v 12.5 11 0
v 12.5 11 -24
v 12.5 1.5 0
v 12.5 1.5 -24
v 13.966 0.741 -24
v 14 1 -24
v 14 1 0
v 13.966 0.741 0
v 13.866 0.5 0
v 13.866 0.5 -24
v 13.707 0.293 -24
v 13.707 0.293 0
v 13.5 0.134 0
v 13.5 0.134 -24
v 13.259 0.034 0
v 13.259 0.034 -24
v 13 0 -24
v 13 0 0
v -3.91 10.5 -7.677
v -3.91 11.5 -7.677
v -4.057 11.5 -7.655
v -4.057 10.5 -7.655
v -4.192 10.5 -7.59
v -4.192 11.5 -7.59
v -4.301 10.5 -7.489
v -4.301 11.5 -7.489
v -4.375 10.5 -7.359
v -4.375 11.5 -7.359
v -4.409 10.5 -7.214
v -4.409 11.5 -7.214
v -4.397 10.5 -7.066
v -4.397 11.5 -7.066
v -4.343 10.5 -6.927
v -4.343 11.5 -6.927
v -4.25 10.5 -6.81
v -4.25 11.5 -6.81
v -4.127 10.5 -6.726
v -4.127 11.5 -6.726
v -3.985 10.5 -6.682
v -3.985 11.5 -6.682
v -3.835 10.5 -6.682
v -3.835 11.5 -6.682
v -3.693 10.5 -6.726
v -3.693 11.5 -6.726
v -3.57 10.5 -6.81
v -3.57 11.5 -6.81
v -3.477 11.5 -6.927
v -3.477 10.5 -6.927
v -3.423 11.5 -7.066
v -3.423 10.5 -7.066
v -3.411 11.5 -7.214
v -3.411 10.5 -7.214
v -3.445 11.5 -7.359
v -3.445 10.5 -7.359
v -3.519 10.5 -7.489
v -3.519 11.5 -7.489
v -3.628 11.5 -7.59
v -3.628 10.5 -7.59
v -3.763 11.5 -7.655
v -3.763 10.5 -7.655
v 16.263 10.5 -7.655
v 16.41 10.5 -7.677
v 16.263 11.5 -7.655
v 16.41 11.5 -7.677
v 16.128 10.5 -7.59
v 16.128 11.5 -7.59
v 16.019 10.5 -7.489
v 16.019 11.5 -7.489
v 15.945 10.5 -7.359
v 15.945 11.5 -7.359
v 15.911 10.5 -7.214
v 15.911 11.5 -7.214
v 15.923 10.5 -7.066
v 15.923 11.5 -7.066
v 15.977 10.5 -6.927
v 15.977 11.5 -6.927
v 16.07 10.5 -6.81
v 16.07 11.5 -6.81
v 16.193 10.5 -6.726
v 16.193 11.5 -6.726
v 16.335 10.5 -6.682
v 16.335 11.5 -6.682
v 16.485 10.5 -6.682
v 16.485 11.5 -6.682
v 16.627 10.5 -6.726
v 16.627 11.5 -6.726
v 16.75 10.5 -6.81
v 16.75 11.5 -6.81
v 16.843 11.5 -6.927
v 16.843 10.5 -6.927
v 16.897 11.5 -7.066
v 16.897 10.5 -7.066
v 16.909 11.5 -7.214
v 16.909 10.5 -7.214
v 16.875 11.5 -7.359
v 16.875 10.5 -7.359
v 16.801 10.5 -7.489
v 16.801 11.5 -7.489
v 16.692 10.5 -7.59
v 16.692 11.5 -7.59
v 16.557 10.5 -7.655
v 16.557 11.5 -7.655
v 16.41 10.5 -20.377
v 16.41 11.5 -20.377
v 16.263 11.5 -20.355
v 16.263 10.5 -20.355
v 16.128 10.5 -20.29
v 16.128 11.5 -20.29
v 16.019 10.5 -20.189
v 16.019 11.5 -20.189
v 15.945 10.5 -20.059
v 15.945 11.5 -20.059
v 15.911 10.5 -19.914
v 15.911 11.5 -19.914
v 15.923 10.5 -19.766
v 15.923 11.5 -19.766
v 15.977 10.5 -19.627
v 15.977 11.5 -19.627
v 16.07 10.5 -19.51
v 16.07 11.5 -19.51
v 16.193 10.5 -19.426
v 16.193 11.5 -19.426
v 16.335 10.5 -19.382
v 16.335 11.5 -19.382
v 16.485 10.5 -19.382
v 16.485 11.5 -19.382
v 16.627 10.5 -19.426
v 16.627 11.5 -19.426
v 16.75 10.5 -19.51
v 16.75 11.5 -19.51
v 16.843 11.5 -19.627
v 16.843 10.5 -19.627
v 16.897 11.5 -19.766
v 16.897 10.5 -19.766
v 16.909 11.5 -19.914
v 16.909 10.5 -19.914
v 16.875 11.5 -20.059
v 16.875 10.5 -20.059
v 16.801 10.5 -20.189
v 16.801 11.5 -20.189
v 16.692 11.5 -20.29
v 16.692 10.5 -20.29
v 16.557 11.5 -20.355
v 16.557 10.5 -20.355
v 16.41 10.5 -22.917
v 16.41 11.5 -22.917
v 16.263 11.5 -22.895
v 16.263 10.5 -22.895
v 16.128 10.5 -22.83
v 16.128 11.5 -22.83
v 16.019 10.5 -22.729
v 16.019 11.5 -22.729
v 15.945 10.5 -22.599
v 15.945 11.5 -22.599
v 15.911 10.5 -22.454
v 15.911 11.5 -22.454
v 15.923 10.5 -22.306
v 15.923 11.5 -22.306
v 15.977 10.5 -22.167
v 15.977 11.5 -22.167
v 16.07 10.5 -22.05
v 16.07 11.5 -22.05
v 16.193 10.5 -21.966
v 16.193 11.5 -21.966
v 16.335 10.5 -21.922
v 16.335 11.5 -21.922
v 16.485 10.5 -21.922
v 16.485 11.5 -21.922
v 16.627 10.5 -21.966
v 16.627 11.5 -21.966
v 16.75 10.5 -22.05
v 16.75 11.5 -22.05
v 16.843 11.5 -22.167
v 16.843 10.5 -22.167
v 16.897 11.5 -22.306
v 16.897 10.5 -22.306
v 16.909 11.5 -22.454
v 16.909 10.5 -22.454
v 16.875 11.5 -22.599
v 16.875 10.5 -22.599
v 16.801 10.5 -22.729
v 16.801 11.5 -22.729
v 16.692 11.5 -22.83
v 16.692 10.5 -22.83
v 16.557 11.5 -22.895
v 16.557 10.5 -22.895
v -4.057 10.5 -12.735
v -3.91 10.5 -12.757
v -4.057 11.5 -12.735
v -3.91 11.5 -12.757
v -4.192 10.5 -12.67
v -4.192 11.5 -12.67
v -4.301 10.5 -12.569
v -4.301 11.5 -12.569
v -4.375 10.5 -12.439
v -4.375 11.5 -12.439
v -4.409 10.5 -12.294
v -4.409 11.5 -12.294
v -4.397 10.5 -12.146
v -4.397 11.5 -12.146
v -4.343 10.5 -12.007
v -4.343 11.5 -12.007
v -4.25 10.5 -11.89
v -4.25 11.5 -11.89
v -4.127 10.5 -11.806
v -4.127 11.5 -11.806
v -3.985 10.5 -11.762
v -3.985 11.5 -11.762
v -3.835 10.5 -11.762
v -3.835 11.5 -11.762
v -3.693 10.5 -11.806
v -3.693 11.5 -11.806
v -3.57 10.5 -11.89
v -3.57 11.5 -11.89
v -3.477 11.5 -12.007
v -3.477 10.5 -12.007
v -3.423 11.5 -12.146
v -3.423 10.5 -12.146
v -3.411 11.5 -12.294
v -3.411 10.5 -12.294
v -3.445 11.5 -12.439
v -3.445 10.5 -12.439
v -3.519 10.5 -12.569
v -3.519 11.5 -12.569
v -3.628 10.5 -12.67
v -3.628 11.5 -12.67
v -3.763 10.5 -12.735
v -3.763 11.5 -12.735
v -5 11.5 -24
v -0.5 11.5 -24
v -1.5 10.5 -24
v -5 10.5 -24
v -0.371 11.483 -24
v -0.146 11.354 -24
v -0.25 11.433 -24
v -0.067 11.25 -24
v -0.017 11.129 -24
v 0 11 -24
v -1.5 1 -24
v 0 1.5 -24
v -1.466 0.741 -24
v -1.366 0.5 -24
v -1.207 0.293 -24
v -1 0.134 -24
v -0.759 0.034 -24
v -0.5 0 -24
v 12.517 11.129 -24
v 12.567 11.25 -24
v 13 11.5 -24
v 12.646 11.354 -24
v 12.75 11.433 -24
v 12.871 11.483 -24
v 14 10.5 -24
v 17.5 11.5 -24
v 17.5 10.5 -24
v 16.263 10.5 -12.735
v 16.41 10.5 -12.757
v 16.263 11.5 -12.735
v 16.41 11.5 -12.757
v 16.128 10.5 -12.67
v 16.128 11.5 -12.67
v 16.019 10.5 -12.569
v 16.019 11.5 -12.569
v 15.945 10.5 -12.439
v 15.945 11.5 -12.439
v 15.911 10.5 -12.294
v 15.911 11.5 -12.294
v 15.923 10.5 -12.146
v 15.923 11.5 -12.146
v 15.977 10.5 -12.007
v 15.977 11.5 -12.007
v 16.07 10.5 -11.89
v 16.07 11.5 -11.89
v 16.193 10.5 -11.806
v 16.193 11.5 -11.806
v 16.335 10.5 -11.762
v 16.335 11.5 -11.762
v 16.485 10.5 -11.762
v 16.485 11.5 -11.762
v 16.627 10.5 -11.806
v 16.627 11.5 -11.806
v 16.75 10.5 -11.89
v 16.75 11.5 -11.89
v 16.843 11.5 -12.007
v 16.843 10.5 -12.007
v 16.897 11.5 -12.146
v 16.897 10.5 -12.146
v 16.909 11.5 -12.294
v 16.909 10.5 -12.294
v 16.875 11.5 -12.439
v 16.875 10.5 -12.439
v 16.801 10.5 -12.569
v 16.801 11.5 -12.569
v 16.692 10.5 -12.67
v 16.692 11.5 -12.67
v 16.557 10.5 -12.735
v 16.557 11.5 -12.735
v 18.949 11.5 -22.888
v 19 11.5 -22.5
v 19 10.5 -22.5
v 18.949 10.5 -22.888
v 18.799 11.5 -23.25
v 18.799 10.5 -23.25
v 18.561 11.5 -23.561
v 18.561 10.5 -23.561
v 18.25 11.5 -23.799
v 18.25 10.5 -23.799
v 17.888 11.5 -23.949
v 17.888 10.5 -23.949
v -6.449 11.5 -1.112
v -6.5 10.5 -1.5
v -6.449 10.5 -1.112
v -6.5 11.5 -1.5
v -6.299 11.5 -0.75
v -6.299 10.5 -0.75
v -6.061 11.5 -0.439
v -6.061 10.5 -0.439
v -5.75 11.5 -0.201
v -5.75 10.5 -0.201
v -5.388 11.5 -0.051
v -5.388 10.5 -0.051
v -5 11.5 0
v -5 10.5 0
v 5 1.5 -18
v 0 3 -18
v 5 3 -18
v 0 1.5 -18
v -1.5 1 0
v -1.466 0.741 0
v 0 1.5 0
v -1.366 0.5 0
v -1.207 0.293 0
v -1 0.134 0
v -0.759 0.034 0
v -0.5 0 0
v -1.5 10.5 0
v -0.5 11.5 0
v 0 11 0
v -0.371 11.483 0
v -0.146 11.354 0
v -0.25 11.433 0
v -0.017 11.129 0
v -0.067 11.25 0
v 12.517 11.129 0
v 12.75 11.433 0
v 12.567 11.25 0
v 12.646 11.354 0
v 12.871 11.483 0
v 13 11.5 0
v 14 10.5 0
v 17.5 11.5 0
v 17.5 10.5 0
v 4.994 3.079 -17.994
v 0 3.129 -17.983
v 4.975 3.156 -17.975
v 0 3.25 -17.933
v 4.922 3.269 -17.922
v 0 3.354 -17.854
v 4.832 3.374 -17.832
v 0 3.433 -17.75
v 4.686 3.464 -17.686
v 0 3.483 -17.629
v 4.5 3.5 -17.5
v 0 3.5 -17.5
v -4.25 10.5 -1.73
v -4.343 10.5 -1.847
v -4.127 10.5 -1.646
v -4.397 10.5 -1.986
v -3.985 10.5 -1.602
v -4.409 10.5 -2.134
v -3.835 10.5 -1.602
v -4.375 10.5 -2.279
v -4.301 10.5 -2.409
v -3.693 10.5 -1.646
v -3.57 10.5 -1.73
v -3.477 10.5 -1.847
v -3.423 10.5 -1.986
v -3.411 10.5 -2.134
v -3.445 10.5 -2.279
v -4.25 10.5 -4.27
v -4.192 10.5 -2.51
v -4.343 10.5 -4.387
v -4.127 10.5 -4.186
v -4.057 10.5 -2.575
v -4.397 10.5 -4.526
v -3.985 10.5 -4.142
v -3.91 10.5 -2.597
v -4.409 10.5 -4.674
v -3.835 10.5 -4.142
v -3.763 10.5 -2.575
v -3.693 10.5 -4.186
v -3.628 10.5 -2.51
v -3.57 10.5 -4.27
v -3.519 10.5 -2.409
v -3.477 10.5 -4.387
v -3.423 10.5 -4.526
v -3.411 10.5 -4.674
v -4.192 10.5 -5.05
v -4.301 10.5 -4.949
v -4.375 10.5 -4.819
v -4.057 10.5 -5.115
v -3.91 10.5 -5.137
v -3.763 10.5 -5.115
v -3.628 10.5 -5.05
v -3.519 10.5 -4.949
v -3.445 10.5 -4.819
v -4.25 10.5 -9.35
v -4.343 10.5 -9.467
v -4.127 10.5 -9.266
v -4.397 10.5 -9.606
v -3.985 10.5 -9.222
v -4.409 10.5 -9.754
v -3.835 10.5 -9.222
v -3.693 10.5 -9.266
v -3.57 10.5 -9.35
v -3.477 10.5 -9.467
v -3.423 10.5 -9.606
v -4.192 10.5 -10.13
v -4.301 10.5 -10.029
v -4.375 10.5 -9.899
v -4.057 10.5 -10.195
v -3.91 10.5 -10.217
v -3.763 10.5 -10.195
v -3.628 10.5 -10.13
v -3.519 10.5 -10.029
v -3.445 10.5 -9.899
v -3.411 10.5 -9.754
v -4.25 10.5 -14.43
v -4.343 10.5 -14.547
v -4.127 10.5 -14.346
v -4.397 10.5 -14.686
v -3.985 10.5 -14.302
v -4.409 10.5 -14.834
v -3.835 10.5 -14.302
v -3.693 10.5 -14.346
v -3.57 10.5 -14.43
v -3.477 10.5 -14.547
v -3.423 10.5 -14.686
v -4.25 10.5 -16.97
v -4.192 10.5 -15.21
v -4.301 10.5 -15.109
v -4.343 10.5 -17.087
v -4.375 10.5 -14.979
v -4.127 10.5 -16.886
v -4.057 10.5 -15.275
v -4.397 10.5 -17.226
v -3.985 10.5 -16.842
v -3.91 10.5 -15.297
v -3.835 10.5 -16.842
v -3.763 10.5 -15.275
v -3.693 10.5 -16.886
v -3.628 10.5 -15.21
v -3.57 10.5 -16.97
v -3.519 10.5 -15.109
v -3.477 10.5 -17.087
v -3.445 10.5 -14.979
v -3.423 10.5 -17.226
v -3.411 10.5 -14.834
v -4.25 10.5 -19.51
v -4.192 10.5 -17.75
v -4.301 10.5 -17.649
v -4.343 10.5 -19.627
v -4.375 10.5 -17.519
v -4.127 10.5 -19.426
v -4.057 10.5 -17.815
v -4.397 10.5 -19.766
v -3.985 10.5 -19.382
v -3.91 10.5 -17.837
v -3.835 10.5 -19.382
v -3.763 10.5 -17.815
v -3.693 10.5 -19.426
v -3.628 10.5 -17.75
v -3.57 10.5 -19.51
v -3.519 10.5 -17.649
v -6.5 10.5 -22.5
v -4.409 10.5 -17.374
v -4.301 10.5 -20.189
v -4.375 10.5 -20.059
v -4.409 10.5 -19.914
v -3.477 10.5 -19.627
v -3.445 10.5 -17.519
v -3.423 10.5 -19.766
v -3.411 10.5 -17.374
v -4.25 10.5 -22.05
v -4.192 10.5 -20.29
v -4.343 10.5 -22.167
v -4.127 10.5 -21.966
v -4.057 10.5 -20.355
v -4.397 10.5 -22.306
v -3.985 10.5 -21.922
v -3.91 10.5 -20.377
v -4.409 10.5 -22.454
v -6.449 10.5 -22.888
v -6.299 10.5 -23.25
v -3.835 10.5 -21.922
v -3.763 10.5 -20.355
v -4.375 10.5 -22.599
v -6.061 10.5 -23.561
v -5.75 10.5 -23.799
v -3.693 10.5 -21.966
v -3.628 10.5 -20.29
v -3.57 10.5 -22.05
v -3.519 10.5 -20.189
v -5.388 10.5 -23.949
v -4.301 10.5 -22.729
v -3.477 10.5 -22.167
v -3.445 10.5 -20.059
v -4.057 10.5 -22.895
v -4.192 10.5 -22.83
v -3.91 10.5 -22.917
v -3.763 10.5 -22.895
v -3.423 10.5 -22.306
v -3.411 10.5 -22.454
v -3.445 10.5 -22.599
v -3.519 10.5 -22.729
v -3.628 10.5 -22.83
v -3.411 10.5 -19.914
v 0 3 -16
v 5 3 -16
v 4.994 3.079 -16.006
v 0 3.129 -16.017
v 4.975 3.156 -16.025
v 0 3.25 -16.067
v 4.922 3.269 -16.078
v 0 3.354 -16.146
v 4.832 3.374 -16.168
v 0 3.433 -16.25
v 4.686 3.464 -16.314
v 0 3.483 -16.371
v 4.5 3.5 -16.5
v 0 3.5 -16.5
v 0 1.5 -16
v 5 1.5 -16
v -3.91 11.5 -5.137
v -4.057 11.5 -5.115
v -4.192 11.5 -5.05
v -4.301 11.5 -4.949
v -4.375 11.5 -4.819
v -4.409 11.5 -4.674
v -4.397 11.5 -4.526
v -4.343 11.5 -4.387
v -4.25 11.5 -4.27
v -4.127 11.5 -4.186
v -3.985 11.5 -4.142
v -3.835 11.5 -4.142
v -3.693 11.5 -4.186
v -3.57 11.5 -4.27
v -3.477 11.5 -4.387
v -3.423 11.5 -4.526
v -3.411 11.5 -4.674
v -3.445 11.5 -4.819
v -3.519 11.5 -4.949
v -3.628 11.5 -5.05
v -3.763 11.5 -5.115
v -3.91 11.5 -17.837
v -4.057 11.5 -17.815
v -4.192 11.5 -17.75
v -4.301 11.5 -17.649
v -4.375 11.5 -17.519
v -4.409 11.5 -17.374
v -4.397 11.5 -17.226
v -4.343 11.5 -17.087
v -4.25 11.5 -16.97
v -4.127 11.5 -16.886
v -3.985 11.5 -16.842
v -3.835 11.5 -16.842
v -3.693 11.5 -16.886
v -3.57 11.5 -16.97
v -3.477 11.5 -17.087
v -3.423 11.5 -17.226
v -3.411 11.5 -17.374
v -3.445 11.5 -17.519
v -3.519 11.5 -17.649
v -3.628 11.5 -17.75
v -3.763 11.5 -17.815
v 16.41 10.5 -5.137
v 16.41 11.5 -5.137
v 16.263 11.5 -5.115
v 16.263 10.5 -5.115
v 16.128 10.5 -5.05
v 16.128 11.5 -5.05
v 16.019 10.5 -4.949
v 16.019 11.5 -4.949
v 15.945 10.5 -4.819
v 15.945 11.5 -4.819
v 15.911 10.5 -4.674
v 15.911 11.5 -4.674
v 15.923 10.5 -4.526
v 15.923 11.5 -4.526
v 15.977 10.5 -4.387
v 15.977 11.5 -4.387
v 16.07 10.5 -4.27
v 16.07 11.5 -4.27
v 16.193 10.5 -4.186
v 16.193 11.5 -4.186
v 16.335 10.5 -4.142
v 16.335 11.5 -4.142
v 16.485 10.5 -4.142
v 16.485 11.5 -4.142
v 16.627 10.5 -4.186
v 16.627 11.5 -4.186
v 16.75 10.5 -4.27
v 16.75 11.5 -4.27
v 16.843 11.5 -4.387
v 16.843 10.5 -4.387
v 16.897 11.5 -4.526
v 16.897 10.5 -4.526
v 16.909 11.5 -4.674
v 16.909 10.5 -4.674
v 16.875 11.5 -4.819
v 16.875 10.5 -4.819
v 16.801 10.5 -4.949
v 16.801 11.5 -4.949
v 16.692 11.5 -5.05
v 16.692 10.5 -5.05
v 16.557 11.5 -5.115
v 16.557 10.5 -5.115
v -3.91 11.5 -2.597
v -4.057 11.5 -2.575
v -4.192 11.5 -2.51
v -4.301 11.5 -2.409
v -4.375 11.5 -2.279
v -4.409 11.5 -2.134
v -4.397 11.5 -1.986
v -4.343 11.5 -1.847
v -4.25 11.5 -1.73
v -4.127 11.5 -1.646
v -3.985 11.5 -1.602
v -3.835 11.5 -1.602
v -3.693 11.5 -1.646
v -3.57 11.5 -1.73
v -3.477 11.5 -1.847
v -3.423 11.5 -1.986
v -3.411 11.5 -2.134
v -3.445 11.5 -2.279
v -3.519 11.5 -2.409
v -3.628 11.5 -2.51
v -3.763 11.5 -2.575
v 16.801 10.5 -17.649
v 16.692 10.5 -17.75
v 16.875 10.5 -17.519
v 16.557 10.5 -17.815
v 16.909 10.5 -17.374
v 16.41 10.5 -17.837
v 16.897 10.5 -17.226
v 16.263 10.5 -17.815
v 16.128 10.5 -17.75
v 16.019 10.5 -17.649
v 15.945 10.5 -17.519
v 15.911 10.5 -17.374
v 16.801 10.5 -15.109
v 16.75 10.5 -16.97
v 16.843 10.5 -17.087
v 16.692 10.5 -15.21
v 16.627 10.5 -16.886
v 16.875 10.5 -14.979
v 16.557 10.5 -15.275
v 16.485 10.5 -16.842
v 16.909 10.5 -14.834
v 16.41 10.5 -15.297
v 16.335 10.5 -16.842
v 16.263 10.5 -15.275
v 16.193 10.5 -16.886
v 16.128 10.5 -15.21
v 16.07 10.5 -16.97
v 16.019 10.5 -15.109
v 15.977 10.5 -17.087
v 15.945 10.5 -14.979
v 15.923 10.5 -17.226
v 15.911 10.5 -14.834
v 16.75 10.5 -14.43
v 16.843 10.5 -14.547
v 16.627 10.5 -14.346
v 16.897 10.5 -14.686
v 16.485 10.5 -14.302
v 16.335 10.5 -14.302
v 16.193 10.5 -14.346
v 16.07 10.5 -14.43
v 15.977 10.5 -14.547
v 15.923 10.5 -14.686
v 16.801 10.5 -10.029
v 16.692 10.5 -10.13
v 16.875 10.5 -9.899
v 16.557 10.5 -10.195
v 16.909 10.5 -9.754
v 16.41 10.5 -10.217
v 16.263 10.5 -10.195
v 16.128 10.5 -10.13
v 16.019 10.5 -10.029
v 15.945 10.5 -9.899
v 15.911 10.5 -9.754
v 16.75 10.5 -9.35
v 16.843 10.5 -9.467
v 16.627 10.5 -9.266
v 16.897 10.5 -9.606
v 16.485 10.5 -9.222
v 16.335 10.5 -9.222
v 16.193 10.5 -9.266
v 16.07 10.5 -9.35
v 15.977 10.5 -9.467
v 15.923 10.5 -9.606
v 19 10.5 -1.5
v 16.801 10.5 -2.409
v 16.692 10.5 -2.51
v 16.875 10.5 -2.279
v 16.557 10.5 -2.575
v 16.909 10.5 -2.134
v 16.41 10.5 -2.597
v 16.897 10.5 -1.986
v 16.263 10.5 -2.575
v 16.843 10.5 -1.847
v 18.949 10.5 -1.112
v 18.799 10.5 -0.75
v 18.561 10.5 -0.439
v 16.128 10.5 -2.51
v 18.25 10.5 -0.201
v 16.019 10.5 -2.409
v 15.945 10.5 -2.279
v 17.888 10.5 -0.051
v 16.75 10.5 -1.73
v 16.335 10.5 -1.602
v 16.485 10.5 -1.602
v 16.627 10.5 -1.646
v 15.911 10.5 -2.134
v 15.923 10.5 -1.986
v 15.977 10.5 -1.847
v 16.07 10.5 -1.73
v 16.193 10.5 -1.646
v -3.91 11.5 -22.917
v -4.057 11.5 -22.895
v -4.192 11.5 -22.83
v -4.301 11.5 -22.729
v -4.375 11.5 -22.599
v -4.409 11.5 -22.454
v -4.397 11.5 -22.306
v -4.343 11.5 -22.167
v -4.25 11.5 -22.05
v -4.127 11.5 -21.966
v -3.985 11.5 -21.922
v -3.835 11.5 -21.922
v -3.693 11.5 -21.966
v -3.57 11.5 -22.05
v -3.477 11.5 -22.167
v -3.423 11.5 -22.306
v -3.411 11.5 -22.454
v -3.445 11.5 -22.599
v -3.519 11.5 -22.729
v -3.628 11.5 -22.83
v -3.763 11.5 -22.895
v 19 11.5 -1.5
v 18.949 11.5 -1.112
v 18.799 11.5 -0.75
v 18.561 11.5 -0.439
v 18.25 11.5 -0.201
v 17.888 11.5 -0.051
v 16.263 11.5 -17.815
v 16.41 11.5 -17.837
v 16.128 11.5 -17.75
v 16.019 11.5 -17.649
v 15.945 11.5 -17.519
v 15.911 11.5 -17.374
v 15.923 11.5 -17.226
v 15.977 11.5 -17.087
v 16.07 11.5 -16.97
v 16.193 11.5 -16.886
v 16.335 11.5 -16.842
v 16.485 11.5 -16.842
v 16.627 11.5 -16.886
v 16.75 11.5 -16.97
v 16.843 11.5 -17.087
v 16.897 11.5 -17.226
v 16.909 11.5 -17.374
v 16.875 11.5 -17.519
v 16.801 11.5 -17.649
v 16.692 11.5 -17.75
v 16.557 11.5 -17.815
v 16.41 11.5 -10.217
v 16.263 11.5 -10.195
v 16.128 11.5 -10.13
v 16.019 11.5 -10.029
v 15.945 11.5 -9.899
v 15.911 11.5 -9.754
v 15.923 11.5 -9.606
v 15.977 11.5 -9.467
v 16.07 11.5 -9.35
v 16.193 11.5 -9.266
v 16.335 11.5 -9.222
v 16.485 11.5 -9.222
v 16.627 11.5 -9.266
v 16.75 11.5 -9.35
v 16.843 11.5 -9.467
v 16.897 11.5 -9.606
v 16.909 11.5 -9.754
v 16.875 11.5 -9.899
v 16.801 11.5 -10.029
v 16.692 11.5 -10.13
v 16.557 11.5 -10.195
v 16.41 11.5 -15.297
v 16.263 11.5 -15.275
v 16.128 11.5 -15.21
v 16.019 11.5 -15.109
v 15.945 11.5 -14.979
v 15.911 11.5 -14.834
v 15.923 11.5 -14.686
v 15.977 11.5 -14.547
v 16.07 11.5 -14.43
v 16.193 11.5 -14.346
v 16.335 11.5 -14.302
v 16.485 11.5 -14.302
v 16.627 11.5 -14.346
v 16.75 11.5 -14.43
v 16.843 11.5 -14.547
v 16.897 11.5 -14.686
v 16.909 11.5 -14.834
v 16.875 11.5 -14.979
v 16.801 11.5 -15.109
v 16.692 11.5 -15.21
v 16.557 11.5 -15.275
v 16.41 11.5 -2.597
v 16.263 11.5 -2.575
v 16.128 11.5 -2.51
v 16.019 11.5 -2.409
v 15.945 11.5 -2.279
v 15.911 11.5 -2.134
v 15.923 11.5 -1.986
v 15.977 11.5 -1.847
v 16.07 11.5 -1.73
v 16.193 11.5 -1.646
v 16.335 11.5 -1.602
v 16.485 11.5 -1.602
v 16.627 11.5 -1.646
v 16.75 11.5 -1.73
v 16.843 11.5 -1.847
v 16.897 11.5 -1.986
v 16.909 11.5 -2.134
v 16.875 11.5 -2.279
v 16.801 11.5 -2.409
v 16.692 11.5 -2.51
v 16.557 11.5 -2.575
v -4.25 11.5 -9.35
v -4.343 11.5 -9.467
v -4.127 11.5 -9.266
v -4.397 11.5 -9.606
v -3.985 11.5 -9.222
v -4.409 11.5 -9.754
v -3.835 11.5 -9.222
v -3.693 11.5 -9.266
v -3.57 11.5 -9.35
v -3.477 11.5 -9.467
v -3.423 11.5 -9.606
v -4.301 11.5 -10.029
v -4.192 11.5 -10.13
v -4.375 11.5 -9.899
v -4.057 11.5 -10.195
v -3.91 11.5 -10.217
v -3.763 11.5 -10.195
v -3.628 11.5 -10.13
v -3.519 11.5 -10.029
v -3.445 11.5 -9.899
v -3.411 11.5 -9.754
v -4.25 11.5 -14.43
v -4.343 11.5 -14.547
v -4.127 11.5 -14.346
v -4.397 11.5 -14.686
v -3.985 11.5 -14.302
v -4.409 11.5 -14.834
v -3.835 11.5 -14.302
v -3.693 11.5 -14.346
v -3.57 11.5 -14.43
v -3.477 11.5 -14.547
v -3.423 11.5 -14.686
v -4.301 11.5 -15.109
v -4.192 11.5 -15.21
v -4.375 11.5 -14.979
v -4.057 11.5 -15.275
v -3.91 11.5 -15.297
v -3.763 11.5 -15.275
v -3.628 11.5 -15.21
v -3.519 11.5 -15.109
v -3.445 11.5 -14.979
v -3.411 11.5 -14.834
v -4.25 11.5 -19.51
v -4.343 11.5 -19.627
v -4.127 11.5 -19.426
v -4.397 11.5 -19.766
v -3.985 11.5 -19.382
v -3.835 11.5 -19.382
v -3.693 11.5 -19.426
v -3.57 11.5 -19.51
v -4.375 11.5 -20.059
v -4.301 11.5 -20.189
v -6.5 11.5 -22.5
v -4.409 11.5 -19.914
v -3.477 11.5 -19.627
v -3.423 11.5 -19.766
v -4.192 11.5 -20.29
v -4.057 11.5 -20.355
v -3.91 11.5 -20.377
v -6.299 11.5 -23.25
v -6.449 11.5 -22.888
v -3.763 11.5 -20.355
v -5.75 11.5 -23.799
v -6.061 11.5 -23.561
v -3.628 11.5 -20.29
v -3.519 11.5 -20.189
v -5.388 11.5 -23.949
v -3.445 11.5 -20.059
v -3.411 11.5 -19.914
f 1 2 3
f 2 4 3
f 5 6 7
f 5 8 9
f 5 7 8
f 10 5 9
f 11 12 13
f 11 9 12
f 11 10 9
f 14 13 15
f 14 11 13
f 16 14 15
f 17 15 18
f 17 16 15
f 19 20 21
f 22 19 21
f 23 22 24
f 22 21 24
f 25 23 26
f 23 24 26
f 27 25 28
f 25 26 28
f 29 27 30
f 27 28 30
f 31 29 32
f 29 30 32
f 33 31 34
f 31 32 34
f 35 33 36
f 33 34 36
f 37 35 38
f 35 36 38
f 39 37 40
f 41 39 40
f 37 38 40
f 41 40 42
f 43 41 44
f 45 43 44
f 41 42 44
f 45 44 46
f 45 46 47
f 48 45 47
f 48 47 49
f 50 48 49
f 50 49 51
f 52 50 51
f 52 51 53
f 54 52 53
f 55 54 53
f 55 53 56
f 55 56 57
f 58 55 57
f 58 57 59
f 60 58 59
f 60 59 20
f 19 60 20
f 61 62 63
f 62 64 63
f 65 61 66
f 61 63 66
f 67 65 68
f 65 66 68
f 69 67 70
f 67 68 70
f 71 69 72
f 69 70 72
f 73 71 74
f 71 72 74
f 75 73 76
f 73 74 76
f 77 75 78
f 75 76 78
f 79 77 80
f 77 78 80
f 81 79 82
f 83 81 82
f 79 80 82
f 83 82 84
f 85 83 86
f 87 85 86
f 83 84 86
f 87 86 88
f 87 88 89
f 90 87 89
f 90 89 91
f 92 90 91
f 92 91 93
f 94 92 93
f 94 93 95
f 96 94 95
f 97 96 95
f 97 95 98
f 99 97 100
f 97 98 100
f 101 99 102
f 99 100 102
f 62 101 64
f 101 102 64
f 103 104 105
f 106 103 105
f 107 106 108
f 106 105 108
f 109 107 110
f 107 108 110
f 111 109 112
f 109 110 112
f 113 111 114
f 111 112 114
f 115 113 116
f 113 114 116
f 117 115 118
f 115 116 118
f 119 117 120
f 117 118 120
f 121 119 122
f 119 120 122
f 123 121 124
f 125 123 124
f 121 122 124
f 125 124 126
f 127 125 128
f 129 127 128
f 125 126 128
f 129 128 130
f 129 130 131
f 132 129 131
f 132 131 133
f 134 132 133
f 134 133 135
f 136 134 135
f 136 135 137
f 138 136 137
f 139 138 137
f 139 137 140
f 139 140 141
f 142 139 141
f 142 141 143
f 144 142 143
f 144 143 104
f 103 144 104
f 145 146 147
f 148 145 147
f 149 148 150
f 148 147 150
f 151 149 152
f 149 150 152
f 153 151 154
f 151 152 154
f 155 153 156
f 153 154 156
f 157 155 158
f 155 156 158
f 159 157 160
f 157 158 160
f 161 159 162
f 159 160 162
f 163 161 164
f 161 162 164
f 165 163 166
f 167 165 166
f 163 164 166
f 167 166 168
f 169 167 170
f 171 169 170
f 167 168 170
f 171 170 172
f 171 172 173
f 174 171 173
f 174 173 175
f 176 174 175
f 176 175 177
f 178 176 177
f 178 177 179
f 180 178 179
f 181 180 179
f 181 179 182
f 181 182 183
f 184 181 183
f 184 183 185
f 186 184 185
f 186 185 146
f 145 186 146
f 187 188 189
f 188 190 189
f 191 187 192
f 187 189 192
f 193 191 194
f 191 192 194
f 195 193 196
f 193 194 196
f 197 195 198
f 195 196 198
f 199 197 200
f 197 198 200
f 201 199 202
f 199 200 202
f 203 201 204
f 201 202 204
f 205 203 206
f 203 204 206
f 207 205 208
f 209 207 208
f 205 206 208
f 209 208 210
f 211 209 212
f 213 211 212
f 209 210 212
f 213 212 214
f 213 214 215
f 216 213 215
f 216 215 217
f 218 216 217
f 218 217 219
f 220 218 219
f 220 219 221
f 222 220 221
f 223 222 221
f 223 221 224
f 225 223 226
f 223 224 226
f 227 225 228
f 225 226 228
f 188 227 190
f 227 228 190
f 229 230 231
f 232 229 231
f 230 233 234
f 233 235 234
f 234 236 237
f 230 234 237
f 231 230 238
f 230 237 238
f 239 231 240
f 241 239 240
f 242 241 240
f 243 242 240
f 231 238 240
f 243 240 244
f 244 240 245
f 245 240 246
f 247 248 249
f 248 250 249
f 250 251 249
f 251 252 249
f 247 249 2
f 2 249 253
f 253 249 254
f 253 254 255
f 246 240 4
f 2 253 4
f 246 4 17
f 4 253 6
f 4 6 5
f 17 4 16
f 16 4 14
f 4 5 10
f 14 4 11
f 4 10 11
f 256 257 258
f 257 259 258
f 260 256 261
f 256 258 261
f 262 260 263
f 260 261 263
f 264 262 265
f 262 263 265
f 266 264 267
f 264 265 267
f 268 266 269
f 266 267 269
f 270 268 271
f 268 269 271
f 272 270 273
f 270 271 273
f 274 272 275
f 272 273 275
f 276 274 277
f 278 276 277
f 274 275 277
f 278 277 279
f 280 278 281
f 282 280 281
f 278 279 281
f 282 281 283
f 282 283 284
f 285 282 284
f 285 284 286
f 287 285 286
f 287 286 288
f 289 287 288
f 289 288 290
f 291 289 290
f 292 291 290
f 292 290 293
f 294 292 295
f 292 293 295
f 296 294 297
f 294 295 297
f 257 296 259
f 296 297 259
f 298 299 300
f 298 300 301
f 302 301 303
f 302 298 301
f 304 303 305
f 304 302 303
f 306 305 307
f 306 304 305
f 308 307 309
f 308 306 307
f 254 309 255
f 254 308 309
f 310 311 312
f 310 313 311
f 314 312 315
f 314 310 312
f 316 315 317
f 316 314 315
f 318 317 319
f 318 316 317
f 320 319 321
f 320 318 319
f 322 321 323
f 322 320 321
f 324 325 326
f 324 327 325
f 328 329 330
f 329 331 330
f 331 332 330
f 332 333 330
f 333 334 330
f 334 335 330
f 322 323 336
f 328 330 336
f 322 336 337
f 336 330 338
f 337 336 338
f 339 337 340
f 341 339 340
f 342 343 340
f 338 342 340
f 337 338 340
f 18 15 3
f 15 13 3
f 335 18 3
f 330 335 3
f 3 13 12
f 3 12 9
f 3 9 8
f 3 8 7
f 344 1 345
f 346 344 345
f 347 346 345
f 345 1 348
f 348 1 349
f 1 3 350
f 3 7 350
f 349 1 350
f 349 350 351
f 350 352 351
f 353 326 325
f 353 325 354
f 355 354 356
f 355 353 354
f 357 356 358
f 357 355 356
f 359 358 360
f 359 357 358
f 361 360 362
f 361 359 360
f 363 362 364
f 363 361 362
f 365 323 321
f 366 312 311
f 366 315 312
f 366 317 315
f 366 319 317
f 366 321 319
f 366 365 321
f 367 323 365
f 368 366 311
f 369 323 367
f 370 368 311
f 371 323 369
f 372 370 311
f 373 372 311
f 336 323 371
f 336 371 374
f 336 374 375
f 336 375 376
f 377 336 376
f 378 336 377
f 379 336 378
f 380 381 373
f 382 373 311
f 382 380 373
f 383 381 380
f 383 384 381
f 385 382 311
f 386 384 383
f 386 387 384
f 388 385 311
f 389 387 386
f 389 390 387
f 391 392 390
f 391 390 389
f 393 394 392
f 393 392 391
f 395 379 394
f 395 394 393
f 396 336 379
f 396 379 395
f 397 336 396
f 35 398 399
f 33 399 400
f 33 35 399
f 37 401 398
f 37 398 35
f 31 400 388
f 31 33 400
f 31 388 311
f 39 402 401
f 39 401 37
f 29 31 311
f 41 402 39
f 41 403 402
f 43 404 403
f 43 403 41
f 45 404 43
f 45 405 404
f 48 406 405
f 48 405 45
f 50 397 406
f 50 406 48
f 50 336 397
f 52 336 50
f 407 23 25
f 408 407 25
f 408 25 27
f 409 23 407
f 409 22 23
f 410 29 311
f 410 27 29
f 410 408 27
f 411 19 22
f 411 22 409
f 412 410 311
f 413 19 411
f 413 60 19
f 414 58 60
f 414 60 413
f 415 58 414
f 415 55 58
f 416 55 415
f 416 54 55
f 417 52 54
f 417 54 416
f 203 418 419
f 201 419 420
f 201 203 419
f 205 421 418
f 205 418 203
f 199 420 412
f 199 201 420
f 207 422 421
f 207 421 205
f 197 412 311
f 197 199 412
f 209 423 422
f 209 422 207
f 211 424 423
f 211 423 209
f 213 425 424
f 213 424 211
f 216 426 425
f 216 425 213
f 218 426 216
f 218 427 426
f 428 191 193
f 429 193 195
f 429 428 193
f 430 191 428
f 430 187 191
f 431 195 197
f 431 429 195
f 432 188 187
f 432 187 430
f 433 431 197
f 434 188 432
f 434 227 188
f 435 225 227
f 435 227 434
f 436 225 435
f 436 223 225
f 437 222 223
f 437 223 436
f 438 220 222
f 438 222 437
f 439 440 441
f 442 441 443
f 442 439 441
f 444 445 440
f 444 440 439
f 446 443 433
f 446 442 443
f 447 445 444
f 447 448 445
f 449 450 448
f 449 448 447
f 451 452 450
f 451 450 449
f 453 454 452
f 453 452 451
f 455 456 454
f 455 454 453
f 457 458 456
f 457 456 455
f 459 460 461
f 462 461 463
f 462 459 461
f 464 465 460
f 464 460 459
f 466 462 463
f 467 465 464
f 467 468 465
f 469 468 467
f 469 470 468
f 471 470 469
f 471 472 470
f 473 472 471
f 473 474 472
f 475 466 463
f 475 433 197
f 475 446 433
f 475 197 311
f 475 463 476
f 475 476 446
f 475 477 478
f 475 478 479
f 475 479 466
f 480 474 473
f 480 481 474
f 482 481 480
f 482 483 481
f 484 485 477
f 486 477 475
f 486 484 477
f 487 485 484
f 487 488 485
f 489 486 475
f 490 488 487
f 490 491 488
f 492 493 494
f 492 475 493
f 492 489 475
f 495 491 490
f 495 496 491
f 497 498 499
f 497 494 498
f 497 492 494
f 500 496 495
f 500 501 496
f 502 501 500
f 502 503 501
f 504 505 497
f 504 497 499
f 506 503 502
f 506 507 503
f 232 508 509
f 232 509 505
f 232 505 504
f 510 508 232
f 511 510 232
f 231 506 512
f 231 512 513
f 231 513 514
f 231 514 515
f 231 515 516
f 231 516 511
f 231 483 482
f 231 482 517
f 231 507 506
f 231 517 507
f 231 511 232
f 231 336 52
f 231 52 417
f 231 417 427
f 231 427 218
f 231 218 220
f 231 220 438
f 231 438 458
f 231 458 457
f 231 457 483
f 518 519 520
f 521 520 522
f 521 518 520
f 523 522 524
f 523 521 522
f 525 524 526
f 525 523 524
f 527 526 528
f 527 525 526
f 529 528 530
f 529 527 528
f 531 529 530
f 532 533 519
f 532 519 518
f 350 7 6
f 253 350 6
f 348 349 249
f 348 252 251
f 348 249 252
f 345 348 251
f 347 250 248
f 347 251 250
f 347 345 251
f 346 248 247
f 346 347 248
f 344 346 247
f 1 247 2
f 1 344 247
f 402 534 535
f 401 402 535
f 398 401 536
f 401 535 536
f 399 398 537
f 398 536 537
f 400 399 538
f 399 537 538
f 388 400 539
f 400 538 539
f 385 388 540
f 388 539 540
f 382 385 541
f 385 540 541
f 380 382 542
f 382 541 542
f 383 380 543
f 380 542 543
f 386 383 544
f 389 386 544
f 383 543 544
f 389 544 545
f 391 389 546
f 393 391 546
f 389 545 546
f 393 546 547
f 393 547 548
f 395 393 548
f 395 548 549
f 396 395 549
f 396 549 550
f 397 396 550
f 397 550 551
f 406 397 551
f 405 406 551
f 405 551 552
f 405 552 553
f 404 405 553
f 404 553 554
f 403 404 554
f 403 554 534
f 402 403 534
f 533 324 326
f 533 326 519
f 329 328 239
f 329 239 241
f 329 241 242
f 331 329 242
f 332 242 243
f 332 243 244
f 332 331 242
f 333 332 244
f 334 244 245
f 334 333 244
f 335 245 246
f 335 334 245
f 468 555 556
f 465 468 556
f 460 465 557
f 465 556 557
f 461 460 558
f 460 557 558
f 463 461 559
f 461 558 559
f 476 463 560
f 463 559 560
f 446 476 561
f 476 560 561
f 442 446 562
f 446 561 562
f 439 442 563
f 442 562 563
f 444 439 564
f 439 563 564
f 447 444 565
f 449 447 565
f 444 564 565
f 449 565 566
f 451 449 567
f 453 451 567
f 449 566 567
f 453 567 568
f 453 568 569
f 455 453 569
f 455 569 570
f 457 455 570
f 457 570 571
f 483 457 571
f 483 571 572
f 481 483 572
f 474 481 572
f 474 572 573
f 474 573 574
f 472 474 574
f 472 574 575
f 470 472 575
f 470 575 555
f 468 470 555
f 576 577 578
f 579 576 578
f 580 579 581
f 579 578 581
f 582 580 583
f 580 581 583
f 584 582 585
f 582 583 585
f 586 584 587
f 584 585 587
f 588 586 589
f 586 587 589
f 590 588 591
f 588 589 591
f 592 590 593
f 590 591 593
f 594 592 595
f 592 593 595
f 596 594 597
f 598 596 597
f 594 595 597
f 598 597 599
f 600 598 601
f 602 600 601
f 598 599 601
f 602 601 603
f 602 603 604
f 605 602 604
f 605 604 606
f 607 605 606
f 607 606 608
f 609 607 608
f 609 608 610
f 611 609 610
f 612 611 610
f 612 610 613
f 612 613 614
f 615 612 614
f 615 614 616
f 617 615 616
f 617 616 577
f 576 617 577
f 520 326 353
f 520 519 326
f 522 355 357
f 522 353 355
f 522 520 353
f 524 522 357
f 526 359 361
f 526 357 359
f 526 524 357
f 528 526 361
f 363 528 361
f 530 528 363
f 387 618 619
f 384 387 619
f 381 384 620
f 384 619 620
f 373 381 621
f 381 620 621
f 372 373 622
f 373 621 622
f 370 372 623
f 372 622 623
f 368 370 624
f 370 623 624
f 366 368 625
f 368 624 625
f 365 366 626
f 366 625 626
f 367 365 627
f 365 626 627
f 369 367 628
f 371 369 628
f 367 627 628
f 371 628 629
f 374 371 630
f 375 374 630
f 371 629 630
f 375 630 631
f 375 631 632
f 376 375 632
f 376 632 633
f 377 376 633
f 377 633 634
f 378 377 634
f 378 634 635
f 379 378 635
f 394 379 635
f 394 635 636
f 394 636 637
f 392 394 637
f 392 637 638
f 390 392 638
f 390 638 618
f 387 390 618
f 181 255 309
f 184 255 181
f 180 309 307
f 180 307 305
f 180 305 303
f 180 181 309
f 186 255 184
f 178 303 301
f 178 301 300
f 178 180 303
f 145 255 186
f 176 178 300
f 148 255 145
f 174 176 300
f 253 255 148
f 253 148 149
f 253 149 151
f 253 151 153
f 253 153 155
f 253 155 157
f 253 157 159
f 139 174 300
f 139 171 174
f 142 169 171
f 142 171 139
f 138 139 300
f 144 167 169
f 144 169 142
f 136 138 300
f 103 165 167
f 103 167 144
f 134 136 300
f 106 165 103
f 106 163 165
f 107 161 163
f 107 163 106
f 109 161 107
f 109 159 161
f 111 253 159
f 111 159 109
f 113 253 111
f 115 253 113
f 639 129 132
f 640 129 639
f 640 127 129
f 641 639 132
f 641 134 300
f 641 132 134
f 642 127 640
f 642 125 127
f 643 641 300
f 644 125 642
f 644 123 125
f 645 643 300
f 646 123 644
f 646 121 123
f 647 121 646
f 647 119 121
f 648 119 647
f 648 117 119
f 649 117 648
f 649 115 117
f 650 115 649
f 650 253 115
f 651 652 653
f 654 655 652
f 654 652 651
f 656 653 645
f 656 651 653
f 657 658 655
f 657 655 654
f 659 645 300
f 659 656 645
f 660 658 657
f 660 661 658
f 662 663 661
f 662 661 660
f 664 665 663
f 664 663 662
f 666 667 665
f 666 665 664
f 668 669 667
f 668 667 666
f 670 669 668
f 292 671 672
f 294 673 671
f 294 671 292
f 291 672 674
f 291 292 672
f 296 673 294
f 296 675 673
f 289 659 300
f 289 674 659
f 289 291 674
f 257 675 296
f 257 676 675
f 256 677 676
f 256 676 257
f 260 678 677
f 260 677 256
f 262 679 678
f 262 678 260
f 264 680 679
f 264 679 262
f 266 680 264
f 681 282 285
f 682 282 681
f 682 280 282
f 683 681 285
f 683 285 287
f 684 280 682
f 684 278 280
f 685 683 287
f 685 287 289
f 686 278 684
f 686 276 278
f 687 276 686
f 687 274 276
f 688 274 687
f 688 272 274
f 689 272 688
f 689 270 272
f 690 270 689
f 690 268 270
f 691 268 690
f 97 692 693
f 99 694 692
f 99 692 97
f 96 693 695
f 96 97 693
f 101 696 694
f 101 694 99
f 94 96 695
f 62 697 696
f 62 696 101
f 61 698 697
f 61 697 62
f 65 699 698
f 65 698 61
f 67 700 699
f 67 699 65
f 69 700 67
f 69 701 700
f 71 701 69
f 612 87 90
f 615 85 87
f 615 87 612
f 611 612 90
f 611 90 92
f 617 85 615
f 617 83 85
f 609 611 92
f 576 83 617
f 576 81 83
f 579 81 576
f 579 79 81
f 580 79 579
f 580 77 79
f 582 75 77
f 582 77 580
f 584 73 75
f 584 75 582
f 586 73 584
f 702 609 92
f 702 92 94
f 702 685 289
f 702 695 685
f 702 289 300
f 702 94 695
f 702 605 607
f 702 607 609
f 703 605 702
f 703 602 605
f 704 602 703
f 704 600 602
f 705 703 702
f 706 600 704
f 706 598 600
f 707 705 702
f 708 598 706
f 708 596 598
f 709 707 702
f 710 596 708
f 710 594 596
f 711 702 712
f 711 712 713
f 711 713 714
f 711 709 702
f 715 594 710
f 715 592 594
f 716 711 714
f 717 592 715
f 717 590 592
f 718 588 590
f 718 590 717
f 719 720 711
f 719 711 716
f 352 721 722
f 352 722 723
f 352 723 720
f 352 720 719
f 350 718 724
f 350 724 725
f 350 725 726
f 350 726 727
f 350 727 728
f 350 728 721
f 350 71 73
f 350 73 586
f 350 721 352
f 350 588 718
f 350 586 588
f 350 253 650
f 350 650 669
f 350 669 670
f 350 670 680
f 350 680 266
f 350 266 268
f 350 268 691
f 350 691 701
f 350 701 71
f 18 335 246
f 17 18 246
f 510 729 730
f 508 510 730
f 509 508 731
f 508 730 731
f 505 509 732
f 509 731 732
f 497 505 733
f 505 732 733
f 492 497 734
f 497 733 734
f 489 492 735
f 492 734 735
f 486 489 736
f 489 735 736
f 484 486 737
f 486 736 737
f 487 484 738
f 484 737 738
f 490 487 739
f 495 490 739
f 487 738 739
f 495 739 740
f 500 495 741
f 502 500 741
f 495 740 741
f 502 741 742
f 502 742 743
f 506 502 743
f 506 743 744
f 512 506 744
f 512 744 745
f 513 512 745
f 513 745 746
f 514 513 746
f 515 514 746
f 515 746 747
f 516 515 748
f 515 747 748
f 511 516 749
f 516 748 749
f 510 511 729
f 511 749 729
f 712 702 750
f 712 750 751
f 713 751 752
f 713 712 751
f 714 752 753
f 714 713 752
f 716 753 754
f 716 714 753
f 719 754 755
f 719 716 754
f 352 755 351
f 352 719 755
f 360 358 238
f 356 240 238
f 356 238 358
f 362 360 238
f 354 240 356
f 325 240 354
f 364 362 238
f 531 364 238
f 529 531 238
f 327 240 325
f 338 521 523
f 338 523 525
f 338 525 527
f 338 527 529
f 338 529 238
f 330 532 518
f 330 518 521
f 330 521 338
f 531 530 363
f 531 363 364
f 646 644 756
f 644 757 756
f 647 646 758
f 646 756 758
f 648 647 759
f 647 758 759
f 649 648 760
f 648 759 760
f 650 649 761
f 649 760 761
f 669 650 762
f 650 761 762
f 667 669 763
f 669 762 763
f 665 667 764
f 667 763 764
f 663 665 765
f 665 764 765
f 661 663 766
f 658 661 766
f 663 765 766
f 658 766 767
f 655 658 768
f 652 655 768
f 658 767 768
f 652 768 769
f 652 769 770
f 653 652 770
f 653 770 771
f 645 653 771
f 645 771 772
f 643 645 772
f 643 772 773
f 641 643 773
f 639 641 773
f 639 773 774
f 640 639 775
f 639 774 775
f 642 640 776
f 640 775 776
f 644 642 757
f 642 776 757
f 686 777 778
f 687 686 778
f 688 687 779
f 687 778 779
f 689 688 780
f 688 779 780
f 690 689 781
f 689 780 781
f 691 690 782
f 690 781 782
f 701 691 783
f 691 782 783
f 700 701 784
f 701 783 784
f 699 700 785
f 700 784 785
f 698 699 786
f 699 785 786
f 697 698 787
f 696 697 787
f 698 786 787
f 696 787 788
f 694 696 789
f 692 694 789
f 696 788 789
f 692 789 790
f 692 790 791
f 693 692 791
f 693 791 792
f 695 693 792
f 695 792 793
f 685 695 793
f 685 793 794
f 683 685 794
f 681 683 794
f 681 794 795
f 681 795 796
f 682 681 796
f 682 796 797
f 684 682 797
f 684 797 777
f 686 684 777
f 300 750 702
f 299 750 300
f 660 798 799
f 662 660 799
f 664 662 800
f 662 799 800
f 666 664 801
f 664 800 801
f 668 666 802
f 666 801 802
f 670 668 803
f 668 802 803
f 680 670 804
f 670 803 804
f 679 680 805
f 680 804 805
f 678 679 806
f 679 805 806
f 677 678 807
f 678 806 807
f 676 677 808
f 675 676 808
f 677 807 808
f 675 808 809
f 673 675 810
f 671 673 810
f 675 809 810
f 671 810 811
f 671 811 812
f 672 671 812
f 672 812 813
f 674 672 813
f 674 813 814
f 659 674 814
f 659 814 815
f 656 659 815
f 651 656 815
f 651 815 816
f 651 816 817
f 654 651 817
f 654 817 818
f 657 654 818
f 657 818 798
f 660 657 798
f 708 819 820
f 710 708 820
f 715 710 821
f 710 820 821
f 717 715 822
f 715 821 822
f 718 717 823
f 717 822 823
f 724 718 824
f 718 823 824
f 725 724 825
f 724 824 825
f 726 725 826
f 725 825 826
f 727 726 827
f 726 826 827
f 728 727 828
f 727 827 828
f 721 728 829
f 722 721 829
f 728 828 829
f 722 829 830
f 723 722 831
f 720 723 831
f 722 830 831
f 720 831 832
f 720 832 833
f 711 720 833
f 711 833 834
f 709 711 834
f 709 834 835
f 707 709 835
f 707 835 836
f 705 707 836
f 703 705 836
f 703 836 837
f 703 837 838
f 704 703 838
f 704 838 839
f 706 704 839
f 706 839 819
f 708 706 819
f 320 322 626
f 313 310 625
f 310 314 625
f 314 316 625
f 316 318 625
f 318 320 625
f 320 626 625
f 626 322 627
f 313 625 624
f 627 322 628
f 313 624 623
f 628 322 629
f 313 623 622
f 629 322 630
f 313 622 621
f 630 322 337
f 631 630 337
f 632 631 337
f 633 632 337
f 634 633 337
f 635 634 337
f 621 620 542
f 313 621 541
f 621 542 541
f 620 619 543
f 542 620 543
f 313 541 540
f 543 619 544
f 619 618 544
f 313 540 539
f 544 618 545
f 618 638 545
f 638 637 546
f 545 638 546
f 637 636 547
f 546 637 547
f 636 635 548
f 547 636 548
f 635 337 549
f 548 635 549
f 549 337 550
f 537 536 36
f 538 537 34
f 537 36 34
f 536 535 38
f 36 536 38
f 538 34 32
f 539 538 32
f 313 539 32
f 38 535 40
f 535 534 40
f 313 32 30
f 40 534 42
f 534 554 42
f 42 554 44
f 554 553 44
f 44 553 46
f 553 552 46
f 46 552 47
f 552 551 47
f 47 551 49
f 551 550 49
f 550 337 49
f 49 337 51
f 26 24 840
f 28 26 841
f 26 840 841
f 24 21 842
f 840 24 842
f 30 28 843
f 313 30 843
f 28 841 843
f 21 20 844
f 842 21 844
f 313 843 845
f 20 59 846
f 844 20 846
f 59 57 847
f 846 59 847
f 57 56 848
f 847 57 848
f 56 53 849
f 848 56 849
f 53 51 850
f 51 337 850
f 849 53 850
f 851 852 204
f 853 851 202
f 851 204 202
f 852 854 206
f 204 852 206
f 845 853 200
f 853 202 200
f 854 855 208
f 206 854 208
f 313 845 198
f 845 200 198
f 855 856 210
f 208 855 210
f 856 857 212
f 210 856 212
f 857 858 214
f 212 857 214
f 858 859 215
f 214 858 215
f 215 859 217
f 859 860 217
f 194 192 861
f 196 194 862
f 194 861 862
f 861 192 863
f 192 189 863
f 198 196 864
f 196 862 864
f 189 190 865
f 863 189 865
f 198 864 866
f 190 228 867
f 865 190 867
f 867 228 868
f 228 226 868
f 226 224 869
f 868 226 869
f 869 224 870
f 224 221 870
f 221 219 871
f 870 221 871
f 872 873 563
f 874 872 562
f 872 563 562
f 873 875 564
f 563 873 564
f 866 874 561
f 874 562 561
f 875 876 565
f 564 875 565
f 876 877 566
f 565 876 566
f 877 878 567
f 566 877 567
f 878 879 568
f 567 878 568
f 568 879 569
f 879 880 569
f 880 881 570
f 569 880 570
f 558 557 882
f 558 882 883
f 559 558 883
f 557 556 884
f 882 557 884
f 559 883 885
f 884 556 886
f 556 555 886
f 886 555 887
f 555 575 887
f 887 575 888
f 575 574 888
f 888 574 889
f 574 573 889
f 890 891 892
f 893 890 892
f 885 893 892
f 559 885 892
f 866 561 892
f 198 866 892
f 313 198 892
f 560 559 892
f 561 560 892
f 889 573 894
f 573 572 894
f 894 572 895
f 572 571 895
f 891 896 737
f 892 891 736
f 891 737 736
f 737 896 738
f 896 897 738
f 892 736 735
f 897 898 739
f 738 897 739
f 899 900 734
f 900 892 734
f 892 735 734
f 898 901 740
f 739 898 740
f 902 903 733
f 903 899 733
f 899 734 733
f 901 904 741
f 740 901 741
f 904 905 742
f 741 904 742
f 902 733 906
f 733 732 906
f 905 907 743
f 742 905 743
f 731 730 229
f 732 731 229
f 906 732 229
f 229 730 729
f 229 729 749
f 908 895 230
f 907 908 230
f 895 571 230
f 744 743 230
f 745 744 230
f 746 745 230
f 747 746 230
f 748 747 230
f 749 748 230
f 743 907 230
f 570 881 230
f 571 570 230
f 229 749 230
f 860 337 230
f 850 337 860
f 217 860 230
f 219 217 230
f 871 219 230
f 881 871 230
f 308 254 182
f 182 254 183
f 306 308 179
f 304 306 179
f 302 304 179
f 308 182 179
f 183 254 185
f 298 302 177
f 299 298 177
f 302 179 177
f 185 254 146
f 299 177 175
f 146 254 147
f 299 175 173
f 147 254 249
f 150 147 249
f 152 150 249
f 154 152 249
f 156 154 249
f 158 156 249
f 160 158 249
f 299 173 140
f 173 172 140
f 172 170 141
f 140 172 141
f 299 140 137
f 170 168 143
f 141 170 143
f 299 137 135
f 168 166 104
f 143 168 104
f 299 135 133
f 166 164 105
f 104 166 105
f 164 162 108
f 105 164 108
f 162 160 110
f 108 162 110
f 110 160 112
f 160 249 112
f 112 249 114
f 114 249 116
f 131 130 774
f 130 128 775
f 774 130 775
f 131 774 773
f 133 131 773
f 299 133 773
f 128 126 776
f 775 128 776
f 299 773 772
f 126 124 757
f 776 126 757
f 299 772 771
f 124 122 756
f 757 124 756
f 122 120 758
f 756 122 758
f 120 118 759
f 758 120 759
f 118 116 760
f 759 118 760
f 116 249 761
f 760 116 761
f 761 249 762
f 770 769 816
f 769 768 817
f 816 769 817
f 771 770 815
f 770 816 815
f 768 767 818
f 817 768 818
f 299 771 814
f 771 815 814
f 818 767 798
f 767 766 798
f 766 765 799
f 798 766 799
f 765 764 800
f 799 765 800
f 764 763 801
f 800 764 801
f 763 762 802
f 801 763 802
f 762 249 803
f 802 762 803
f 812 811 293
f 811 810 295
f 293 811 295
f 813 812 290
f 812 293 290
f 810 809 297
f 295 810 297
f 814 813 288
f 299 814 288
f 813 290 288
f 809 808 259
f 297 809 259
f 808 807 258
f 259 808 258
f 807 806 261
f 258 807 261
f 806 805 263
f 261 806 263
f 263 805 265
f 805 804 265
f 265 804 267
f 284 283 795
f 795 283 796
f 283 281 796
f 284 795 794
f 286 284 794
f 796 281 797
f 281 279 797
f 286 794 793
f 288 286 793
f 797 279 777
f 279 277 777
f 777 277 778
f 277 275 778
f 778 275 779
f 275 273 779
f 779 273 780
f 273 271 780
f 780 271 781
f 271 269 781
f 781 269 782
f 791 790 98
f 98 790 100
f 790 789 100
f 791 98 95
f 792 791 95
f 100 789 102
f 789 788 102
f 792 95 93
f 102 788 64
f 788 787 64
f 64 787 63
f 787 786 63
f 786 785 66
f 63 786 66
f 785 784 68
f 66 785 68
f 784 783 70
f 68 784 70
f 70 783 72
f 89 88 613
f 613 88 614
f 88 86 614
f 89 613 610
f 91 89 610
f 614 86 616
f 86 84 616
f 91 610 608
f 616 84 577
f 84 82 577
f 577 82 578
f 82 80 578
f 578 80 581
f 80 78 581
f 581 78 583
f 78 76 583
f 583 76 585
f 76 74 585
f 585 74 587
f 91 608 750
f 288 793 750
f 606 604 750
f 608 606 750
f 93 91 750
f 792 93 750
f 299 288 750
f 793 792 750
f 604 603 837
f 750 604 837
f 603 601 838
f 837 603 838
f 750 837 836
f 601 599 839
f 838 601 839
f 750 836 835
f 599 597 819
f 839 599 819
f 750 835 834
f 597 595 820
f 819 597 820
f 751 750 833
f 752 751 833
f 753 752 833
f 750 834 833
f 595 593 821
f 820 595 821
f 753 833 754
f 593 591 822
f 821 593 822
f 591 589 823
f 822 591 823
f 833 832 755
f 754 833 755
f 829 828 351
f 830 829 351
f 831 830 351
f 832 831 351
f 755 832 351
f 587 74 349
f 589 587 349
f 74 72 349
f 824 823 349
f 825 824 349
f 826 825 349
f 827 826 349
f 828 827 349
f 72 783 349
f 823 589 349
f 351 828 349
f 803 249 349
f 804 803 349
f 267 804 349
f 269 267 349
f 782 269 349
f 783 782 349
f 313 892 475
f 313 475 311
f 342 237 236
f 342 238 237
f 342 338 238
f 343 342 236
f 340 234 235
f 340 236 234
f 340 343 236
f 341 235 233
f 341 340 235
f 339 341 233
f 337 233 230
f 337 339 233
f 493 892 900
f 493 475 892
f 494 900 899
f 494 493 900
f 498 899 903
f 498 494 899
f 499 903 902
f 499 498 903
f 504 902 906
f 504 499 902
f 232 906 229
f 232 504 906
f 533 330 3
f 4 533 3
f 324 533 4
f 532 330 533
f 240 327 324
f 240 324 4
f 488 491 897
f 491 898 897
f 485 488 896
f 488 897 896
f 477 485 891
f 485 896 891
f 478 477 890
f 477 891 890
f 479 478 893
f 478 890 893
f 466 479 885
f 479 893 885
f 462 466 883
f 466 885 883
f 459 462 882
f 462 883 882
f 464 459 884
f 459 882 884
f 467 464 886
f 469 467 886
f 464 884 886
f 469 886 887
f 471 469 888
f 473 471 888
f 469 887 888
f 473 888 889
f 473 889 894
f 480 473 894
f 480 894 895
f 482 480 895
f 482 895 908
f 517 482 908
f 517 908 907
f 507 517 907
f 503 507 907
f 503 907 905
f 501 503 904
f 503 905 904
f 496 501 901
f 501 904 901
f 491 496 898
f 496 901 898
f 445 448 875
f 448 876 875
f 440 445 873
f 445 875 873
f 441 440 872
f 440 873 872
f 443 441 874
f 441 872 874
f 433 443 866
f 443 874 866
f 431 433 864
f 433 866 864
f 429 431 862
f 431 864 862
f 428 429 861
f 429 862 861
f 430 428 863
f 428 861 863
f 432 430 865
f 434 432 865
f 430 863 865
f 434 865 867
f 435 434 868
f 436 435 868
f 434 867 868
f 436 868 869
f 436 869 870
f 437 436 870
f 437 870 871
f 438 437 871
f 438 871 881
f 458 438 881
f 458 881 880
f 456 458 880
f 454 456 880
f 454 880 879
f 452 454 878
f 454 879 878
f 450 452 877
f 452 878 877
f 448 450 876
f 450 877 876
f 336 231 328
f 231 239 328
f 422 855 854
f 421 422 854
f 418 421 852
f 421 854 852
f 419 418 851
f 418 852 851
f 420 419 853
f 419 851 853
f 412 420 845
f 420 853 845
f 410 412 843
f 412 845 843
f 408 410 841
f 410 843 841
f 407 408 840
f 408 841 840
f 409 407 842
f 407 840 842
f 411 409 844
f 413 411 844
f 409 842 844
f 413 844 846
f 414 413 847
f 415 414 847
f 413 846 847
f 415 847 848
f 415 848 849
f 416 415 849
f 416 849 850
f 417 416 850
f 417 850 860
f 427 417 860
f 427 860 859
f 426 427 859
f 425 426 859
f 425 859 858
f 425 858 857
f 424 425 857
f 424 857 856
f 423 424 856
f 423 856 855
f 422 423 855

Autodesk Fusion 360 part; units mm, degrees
sketch "Sketch1" plane through (0, 0, 0) normal (0, 1, 0) x (1, 0, 0)
  line L0 (0, 0) -> (12.5, 0)
  line L1 (12.5, 0) -> (12.5, 24)
  line L2 (12.5, 24) -> (0, 24)
  line L3 (0, 24) -> (0, 0)
  dimension "d1" = 12.5
  dimension "d2" = 24
extrude "Extrude1" add sketch "Sketch1" along normal blind 1.5
extrude "Extrude2" add 1 faces at (0, 0.5, -16) along direction (-1, 0, 0) blind 1.5
extrude "Extrude3" add 1 faces at (12.5, 0.5, -8) along direction (1, 0, 0) blind 1.5
sketch "Sketch2" plane through (0, 1.5, 0) normal (0, 1, 0) x (-1, 0, 0)
  line L0 (1.5, 0) -> (-14, 0)
  line L1 (-14, 0) -> (-14, -24)
  line L2 (-14, -24) -> (1.5, -24)
  line L3 (1.5, -24) -> (1.5, 0)
  line L4 (1.5, -24) -> (0, -24)
  line L5 (0, -24) -> (0, 0)
  line L6 (0, 0) -> (1.5, 0)
  line L7 (1.5, 0) -> (1.5, -24)
  line L8 (-14, -24) -> (-12.5, -24)
  line L9 (-12.5, -24) -> (-12.5, 0)
  line L10 (-12.5, 0) -> (-14, 0)
  line L11 (-14, 0) -> (-14, -24)
  dimension "d9" = 1.5
extrude "Extrude4" add sketch "Sketch2" along normal blind 10 contours L0 L2 L3 L4 L5 L6 L7 | L0 L1 L2 L8 L9 L10 L11
sketch "Sketch3" plane through (14, 0, 0) normal (1, 0, 0) x (0, 0, -1)
  line L0 (0, 0) -> (24, 0)
  line L1 (24, 0) -> (24, 11.5)
  line L2 (24, 11.5) -> (0, 11.5)
  line L3 (0, 11.5) -> (0, 0)
  line L4 (0, 11.5) -> (24, 11.5)
  line L5 (24, 11.5) -> (24, 10.5)
  line L6 (24, 10.5) -> (0, 10.5)
  line L7 (0, 10.5) -> (0, 11.5)
  dimension "d12" = 1
extrude "Extrude5" add sketch "Sketch3" along normal blind 5 contours L1 L2 L3 L4 L5 L6 L7
sketch "Sketch4" plane through (-1.5, 0, 0) normal (-1, 0, 0) x (0, 0, 1)
  line L0 (-24, 0) -> (0, 0)
  line L1 (0, 0) -> (0, 11.5)
  line L2 (0, 11.5) -> (-24, 11.5)
  line L3 (-24, 11.5) -> (-24, 0)
  line L4 (-24, 11.5) -> (0, 11.5)
  line L5 (0, 11.5) -> (0, 10.5)
  line L6 (0, 10.5) -> (-24, 10.5)
  line L7 (-24, 10.5) -> (-24, 11.5)
  dimension "d15" = 1
extrude "Extrude6" add sketch "Sketch4" along normal blind 5 contours L1 L2 L3 L4 L5 L6 L7
ref_plane "WorkPlane1" through (-4, 10.5, -12) normal (0, -1, 0) x (0, 0, 1)
sketch "Sketch5" plane through (-4, 10.5, -12) normal (0, -1, 0) x (1, 0, 0)
  line L0 (23, 12) -> (23, -12)
  line L1 (-2.5, -12) -> (-2.5, 12)
  point P0 (0.09, 9.9032)
  point P1 (20.41, 9.9032)
  point P2 (0.09, 7.3632)
  point P3 (0.09, 4.8232)
  point P4 (0.09, 2.2832)
  point P5 (0.09, -0.2568)
  point P6 (0.09, -2.7968)
  point P7 (0.09, -5.3368)
  point P8 (0.09, -7.8768)
  point P9 (0.09, -10.4168)
  point P10 (20.41, 7.3632)
  point P11 (20.41, 4.8232)
  point P12 (20.41, 2.2832)
  point P13 (20.41, -0.2568)
  point P14 (20.41, -2.7968)
  point P15 (20.41, -5.3368)
  point P16 (20.41, -7.8768)
  point P17 (20.41, -10.4168)
  dimension "d19" = 20.32
  dimension "d20" = 2.59
  dimension "d21" = 2.59
  dimension "d24" = 0
  dimension "d25" = -20.32
  dimension "d28" = 0
  dimension "d29" = -20.32
hole "Hole1" at (-3.91, 10.5, -2.0968) at (-3.91, 10.5, -4.6368) at (-3.91, 10.5, -7.1768) at (-3.91, 10.5, -9.7168) at (-3.91, 10.5, -12.2568) at (-3.91, 10.5, -14.7968) at (-3.91, 10.5, -17.3368) at (-3.91, 10.5, -19.8768) at (-3.91, 10.5, -22.4168) at (16.41, 10.5, -2.0968) at (16.41, 10.5, -4.6368) at (16.41, 10.5, -7.1768) at (16.41, 10.5, -9.7168) at (16.41, 10.5, -12.2568) at (16.41, 10.5, -14.7968) at (16.41, 10.5, -17.3368) at (16.41, 10.5, -19.8768) at (16.41, 10.5, -22.4168) direction (0, 1, 0) diameter 1 depth 7 tip angle 118
sketch "Sketch6" plane through (0, 1.5, 0) normal (0, 1, 0) x (-1, 0, 0)
  line L0 (-12.5, 0) -> (-12.5, -24)
  line L1 (-12.5, -24) -> (0, -24)
  line L2 (0, -24) -> (0, 0)
  line L3 (0, 0) -> (-12.5, 0)
  line L4 (0, -18) -> (-5, -18)
  line L5 (-5, -18) -> (-5, -16)
  line L6 (-5, -16) -> (0, -16)
  line L7 (0, -16) -> (0, -18)
  dimension "d33" = 5
  dimension "d34" = 2
  dimension "d35" = 6
extrude "Extrude7" add sketch "Sketch6" along normal blind 2 contours L2 L4 L5 L6 L7
fillet "Fillet1" radius 1 2 edges at (-1.5, 0, -12) (14, 0, -12)
fillet "Fillet2" radius 0.5 2 edges at (0, 11.5, -12) (12.5, 11.5, -12)
fillet "Fillet3" radius 1.5 4 edges at (19, 11, -24) (19, 11, 0) (-6.5, 11, 0) (-6.5, 11, -24)
fillet "Fillet4" radius 0.5 3 edges at (5, 3.5, -17) (2.5, 3.5, -18) (2.5, 3.5, -16)
